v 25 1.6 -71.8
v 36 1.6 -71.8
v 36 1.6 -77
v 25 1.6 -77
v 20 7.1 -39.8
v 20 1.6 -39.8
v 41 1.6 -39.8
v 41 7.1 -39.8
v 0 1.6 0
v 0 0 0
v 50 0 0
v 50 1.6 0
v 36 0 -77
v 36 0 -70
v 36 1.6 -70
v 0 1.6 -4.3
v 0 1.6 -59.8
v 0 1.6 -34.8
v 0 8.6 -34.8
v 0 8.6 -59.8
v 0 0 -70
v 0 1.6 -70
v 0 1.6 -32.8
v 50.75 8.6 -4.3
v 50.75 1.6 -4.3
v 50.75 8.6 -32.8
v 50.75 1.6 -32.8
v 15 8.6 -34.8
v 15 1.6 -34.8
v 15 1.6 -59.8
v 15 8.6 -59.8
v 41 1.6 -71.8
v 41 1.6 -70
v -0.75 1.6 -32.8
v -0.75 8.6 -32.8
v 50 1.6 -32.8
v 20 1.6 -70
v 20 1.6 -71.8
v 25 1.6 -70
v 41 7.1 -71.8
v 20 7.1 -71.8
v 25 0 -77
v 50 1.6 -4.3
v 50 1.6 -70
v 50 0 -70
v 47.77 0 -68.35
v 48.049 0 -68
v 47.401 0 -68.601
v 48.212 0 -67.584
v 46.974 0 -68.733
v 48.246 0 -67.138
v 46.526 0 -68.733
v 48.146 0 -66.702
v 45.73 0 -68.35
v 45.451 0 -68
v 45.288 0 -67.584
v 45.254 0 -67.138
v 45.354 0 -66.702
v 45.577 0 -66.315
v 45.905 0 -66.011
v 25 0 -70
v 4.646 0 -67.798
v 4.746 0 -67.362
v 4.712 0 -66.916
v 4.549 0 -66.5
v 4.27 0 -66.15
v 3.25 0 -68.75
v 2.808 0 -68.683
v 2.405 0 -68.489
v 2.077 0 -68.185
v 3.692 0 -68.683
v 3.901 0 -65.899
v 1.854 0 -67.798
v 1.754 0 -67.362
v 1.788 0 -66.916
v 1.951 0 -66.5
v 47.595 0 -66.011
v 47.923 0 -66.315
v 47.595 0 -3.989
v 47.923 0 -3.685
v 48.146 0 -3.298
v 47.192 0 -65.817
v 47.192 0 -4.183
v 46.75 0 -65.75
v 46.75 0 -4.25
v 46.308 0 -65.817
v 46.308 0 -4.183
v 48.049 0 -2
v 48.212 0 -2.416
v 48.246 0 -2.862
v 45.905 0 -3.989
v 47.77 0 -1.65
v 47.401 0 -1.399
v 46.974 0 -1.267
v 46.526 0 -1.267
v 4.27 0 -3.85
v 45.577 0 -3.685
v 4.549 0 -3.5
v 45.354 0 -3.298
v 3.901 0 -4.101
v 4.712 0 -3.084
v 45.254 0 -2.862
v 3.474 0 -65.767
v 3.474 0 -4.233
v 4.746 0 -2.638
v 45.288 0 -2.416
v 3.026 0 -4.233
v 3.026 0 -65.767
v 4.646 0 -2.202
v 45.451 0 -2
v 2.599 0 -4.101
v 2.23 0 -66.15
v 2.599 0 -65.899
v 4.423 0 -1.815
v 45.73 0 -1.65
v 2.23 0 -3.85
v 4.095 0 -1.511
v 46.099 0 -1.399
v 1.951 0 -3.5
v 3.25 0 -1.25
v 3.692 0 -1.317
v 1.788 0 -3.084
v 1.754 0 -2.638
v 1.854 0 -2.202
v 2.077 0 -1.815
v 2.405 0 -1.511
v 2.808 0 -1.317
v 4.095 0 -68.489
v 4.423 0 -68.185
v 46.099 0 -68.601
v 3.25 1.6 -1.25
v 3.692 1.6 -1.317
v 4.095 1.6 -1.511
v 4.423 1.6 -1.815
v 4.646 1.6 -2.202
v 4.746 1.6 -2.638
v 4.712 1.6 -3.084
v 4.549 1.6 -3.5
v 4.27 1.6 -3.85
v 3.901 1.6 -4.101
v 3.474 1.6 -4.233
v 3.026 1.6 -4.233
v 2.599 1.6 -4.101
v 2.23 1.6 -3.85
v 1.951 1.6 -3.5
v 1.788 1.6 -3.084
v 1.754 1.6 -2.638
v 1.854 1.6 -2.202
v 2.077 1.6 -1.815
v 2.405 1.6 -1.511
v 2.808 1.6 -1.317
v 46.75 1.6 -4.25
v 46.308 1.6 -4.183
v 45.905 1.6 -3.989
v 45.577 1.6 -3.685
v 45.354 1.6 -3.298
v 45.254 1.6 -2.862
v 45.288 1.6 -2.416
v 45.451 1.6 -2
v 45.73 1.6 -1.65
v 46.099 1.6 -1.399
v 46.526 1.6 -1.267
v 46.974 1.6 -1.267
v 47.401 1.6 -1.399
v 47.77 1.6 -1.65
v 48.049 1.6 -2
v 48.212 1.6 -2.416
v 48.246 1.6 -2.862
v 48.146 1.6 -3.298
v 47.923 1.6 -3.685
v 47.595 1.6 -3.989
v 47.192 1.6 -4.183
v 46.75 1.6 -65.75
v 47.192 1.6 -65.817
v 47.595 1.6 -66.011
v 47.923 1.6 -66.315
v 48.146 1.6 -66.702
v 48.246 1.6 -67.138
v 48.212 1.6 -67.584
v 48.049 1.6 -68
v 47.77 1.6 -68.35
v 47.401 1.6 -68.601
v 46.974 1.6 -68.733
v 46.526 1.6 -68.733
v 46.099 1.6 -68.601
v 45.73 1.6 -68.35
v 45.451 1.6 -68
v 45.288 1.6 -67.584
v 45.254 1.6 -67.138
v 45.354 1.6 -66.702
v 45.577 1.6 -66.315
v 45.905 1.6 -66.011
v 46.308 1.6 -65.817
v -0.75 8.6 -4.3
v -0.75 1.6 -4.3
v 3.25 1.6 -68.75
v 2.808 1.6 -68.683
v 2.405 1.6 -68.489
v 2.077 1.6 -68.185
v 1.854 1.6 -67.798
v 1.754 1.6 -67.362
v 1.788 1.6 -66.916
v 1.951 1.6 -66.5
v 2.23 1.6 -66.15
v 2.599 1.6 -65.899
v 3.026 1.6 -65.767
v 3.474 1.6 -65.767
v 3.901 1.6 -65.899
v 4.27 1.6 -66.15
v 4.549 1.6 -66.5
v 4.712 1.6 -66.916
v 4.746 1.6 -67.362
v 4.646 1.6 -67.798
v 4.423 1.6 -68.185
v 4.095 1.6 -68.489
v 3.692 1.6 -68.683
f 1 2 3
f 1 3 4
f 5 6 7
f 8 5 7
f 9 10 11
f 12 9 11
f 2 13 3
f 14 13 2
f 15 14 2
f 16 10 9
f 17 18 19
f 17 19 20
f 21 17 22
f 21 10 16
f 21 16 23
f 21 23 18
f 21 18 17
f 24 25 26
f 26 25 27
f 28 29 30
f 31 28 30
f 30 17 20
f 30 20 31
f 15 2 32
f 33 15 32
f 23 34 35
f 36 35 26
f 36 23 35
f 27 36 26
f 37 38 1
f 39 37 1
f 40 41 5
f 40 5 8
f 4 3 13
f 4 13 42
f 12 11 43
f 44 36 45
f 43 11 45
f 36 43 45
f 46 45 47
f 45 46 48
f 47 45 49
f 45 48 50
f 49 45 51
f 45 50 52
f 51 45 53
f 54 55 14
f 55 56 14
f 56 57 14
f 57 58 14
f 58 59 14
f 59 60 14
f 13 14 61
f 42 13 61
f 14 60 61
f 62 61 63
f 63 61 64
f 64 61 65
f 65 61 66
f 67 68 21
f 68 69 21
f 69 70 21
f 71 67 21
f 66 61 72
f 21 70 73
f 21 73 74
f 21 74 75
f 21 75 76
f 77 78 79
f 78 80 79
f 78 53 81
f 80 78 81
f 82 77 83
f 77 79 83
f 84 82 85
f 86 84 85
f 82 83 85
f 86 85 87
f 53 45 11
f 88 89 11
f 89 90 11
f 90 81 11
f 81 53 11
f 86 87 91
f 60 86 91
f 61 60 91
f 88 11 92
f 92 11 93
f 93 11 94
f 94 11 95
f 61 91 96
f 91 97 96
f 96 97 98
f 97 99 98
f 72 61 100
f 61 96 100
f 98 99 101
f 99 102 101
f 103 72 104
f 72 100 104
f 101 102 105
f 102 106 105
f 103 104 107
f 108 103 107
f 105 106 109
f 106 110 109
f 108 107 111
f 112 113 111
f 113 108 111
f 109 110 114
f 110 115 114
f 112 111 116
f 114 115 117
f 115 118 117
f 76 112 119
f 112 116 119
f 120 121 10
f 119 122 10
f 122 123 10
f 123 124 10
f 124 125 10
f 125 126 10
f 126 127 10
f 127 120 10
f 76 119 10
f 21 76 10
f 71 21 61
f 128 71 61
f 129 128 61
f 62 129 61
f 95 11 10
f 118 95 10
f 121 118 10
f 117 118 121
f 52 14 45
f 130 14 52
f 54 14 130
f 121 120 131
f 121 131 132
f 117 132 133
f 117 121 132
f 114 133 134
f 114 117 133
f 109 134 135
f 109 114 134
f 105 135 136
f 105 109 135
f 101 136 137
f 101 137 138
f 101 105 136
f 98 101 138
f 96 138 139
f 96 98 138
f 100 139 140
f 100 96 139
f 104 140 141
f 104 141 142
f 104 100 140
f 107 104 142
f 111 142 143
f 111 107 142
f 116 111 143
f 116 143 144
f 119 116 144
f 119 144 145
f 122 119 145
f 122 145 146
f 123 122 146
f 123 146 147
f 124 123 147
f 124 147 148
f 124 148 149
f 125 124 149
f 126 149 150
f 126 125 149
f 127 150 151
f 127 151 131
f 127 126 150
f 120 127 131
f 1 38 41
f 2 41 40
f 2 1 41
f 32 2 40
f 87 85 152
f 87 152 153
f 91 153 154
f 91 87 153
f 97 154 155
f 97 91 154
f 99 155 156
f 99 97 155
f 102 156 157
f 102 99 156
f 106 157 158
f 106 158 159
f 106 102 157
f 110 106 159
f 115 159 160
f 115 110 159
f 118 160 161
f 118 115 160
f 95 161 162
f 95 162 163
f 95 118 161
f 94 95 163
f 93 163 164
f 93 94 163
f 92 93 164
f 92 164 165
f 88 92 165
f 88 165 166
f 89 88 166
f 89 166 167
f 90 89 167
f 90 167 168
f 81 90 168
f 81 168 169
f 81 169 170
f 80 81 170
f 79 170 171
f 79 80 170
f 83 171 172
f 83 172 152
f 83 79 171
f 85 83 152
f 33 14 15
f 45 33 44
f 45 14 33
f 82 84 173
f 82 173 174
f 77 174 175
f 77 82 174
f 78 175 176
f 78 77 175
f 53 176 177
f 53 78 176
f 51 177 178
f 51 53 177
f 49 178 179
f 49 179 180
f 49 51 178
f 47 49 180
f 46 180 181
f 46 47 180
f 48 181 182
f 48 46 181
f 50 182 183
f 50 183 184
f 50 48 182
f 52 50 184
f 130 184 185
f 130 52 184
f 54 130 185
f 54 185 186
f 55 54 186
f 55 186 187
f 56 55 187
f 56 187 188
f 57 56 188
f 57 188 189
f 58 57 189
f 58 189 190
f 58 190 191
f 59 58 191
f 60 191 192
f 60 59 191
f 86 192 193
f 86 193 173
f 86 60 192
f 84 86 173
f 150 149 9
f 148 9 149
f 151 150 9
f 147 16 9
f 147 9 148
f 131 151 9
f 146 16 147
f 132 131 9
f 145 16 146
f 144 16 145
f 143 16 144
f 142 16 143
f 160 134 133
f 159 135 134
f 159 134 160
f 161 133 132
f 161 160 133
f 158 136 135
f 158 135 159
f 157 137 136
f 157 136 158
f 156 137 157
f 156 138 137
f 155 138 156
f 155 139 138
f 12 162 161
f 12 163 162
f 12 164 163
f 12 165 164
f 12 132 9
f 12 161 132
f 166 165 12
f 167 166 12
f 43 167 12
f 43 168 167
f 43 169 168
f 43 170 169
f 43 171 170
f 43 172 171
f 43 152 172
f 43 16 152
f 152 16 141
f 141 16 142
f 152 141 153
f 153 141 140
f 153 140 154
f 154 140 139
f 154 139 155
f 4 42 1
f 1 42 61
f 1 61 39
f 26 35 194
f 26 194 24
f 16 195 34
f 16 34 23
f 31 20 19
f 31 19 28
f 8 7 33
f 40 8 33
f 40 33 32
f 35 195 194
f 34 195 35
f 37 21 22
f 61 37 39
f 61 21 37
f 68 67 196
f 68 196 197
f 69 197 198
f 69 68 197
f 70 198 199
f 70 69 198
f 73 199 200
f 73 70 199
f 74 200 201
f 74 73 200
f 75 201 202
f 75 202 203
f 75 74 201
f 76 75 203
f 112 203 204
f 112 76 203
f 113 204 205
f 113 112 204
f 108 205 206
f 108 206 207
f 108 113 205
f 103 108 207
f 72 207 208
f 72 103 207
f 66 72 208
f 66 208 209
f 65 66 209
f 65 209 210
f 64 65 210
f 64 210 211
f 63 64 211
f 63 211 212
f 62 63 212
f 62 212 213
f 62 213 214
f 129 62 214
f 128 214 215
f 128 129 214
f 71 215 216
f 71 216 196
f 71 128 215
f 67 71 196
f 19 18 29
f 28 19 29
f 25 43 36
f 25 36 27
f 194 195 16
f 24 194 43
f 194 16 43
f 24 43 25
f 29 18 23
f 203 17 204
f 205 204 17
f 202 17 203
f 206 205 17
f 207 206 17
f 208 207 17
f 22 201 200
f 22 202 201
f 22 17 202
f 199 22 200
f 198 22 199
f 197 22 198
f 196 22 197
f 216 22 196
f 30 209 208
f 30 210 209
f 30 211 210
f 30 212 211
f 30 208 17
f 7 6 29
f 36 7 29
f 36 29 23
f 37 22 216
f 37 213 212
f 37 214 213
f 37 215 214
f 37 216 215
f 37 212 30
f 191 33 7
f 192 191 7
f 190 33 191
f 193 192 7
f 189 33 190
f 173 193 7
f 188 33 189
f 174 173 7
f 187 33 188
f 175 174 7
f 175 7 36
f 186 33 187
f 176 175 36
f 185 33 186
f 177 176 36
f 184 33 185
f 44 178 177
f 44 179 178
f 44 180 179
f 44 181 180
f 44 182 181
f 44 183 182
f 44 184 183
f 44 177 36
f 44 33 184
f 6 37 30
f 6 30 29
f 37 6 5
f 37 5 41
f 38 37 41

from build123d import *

# Parameters (mm, degrees)
SKETCH_1_W      = 50
SKETCH_1_H      = 70
SKETCH_1_R      = 1.5
EXTRUDE_1_DEPTH = 1.6
SKETCH_3_W      = 51.5
SKETCH_3_H      = 28.5
EXTRUDE_2_DEPTH = 7
SKETCH_4_W      = 15
SKETCH_4_H      = 25
EXTRUDE_3_DEPTH = 7
SKETCH_5_W      = 21
SKETCH_5_H      = 32
EXTRUDE_4_DEPTH = 5.5
SKETCH_6_W      = 11
SKETCH_6_H      = 1.6
EXTRUDE_5_DEPTH = 7


with BuildPart() as part:
    # 草图1 → 凸台-拉伸1 (new body)
    with BuildSketch(Plane(origin=(0, 0, 0), x_dir=(1, 0, 0), z_dir=(0, 1, 0))):
        with Locations((25, 35)):
            Rectangle(SKETCH_1_W, SKETCH_1_H)
        with Locations(Location((3.25, 2.75, 0), (0, 0, 270))):
            Circle(SKETCH_1_R, mode=Mode.SUBTRACT)
        with Locations(Location((46.75, 2.75, 0), (0, 0, 90))):
            Circle(SKETCH_1_R, mode=Mode.SUBTRACT)
        with Locations(Location((46.75, 67.25, 0), (0, 0, 270))):
            Circle(SKETCH_1_R, mode=Mode.SUBTRACT)
        with Locations(Location((3.25, 67.25, 0), (0, 0, 90))):
            Circle(SKETCH_1_R, mode=Mode.SUBTRACT)
    extrude(amount=EXTRUDE_1_DEPTH)

    # 草图3 → 凸台-拉伸2 (add)
    with BuildSketch(Plane(origin=(0, 1.6, 0), x_dir=(1, 0, 0), z_dir=(0, 1, 0))):
        with Locations((25, 18.55)):
            Rectangle(SKETCH_3_W, SKETCH_3_H)
    extrude(amount=EXTRUDE_2_DEPTH)

    # 草图4 → 凸台-拉伸3 (add)
    with BuildSketch(Plane(origin=(0, 1.6, 0), x_dir=(1, 0, 0), z_dir=(0, 1, 0))):
        with Locations((7.5, 47.3)):
            Rectangle(SKETCH_4_W, SKETCH_4_H)
    extrude(amount=EXTRUDE_3_DEPTH)

    # 草图5 → 凸台-拉伸4 (add)
    with BuildSketch(Plane(origin=(0, 1.6, 0), x_dir=(1, 0, 0), z_dir=(0, 1, 0))):
        with Locations((30.5, 55.8)):
            Rectangle(SKETCH_5_W, SKETCH_5_H)
    extrude(amount=EXTRUDE_4_DEPTH)

    # 草图6 → 凸台-拉伸5 (add)
    with BuildSketch(Plane(origin=(0, 0, -70), x_dir=(-1, 0, 0), z_dir=(0, 0, -1))):
        with Locations((-30.5, 0.8)):
            Rectangle(SKETCH_6_W, SKETCH_6_H)
    extrude(amount=EXTRUDE_5_DEPTH)


solid = part.part
